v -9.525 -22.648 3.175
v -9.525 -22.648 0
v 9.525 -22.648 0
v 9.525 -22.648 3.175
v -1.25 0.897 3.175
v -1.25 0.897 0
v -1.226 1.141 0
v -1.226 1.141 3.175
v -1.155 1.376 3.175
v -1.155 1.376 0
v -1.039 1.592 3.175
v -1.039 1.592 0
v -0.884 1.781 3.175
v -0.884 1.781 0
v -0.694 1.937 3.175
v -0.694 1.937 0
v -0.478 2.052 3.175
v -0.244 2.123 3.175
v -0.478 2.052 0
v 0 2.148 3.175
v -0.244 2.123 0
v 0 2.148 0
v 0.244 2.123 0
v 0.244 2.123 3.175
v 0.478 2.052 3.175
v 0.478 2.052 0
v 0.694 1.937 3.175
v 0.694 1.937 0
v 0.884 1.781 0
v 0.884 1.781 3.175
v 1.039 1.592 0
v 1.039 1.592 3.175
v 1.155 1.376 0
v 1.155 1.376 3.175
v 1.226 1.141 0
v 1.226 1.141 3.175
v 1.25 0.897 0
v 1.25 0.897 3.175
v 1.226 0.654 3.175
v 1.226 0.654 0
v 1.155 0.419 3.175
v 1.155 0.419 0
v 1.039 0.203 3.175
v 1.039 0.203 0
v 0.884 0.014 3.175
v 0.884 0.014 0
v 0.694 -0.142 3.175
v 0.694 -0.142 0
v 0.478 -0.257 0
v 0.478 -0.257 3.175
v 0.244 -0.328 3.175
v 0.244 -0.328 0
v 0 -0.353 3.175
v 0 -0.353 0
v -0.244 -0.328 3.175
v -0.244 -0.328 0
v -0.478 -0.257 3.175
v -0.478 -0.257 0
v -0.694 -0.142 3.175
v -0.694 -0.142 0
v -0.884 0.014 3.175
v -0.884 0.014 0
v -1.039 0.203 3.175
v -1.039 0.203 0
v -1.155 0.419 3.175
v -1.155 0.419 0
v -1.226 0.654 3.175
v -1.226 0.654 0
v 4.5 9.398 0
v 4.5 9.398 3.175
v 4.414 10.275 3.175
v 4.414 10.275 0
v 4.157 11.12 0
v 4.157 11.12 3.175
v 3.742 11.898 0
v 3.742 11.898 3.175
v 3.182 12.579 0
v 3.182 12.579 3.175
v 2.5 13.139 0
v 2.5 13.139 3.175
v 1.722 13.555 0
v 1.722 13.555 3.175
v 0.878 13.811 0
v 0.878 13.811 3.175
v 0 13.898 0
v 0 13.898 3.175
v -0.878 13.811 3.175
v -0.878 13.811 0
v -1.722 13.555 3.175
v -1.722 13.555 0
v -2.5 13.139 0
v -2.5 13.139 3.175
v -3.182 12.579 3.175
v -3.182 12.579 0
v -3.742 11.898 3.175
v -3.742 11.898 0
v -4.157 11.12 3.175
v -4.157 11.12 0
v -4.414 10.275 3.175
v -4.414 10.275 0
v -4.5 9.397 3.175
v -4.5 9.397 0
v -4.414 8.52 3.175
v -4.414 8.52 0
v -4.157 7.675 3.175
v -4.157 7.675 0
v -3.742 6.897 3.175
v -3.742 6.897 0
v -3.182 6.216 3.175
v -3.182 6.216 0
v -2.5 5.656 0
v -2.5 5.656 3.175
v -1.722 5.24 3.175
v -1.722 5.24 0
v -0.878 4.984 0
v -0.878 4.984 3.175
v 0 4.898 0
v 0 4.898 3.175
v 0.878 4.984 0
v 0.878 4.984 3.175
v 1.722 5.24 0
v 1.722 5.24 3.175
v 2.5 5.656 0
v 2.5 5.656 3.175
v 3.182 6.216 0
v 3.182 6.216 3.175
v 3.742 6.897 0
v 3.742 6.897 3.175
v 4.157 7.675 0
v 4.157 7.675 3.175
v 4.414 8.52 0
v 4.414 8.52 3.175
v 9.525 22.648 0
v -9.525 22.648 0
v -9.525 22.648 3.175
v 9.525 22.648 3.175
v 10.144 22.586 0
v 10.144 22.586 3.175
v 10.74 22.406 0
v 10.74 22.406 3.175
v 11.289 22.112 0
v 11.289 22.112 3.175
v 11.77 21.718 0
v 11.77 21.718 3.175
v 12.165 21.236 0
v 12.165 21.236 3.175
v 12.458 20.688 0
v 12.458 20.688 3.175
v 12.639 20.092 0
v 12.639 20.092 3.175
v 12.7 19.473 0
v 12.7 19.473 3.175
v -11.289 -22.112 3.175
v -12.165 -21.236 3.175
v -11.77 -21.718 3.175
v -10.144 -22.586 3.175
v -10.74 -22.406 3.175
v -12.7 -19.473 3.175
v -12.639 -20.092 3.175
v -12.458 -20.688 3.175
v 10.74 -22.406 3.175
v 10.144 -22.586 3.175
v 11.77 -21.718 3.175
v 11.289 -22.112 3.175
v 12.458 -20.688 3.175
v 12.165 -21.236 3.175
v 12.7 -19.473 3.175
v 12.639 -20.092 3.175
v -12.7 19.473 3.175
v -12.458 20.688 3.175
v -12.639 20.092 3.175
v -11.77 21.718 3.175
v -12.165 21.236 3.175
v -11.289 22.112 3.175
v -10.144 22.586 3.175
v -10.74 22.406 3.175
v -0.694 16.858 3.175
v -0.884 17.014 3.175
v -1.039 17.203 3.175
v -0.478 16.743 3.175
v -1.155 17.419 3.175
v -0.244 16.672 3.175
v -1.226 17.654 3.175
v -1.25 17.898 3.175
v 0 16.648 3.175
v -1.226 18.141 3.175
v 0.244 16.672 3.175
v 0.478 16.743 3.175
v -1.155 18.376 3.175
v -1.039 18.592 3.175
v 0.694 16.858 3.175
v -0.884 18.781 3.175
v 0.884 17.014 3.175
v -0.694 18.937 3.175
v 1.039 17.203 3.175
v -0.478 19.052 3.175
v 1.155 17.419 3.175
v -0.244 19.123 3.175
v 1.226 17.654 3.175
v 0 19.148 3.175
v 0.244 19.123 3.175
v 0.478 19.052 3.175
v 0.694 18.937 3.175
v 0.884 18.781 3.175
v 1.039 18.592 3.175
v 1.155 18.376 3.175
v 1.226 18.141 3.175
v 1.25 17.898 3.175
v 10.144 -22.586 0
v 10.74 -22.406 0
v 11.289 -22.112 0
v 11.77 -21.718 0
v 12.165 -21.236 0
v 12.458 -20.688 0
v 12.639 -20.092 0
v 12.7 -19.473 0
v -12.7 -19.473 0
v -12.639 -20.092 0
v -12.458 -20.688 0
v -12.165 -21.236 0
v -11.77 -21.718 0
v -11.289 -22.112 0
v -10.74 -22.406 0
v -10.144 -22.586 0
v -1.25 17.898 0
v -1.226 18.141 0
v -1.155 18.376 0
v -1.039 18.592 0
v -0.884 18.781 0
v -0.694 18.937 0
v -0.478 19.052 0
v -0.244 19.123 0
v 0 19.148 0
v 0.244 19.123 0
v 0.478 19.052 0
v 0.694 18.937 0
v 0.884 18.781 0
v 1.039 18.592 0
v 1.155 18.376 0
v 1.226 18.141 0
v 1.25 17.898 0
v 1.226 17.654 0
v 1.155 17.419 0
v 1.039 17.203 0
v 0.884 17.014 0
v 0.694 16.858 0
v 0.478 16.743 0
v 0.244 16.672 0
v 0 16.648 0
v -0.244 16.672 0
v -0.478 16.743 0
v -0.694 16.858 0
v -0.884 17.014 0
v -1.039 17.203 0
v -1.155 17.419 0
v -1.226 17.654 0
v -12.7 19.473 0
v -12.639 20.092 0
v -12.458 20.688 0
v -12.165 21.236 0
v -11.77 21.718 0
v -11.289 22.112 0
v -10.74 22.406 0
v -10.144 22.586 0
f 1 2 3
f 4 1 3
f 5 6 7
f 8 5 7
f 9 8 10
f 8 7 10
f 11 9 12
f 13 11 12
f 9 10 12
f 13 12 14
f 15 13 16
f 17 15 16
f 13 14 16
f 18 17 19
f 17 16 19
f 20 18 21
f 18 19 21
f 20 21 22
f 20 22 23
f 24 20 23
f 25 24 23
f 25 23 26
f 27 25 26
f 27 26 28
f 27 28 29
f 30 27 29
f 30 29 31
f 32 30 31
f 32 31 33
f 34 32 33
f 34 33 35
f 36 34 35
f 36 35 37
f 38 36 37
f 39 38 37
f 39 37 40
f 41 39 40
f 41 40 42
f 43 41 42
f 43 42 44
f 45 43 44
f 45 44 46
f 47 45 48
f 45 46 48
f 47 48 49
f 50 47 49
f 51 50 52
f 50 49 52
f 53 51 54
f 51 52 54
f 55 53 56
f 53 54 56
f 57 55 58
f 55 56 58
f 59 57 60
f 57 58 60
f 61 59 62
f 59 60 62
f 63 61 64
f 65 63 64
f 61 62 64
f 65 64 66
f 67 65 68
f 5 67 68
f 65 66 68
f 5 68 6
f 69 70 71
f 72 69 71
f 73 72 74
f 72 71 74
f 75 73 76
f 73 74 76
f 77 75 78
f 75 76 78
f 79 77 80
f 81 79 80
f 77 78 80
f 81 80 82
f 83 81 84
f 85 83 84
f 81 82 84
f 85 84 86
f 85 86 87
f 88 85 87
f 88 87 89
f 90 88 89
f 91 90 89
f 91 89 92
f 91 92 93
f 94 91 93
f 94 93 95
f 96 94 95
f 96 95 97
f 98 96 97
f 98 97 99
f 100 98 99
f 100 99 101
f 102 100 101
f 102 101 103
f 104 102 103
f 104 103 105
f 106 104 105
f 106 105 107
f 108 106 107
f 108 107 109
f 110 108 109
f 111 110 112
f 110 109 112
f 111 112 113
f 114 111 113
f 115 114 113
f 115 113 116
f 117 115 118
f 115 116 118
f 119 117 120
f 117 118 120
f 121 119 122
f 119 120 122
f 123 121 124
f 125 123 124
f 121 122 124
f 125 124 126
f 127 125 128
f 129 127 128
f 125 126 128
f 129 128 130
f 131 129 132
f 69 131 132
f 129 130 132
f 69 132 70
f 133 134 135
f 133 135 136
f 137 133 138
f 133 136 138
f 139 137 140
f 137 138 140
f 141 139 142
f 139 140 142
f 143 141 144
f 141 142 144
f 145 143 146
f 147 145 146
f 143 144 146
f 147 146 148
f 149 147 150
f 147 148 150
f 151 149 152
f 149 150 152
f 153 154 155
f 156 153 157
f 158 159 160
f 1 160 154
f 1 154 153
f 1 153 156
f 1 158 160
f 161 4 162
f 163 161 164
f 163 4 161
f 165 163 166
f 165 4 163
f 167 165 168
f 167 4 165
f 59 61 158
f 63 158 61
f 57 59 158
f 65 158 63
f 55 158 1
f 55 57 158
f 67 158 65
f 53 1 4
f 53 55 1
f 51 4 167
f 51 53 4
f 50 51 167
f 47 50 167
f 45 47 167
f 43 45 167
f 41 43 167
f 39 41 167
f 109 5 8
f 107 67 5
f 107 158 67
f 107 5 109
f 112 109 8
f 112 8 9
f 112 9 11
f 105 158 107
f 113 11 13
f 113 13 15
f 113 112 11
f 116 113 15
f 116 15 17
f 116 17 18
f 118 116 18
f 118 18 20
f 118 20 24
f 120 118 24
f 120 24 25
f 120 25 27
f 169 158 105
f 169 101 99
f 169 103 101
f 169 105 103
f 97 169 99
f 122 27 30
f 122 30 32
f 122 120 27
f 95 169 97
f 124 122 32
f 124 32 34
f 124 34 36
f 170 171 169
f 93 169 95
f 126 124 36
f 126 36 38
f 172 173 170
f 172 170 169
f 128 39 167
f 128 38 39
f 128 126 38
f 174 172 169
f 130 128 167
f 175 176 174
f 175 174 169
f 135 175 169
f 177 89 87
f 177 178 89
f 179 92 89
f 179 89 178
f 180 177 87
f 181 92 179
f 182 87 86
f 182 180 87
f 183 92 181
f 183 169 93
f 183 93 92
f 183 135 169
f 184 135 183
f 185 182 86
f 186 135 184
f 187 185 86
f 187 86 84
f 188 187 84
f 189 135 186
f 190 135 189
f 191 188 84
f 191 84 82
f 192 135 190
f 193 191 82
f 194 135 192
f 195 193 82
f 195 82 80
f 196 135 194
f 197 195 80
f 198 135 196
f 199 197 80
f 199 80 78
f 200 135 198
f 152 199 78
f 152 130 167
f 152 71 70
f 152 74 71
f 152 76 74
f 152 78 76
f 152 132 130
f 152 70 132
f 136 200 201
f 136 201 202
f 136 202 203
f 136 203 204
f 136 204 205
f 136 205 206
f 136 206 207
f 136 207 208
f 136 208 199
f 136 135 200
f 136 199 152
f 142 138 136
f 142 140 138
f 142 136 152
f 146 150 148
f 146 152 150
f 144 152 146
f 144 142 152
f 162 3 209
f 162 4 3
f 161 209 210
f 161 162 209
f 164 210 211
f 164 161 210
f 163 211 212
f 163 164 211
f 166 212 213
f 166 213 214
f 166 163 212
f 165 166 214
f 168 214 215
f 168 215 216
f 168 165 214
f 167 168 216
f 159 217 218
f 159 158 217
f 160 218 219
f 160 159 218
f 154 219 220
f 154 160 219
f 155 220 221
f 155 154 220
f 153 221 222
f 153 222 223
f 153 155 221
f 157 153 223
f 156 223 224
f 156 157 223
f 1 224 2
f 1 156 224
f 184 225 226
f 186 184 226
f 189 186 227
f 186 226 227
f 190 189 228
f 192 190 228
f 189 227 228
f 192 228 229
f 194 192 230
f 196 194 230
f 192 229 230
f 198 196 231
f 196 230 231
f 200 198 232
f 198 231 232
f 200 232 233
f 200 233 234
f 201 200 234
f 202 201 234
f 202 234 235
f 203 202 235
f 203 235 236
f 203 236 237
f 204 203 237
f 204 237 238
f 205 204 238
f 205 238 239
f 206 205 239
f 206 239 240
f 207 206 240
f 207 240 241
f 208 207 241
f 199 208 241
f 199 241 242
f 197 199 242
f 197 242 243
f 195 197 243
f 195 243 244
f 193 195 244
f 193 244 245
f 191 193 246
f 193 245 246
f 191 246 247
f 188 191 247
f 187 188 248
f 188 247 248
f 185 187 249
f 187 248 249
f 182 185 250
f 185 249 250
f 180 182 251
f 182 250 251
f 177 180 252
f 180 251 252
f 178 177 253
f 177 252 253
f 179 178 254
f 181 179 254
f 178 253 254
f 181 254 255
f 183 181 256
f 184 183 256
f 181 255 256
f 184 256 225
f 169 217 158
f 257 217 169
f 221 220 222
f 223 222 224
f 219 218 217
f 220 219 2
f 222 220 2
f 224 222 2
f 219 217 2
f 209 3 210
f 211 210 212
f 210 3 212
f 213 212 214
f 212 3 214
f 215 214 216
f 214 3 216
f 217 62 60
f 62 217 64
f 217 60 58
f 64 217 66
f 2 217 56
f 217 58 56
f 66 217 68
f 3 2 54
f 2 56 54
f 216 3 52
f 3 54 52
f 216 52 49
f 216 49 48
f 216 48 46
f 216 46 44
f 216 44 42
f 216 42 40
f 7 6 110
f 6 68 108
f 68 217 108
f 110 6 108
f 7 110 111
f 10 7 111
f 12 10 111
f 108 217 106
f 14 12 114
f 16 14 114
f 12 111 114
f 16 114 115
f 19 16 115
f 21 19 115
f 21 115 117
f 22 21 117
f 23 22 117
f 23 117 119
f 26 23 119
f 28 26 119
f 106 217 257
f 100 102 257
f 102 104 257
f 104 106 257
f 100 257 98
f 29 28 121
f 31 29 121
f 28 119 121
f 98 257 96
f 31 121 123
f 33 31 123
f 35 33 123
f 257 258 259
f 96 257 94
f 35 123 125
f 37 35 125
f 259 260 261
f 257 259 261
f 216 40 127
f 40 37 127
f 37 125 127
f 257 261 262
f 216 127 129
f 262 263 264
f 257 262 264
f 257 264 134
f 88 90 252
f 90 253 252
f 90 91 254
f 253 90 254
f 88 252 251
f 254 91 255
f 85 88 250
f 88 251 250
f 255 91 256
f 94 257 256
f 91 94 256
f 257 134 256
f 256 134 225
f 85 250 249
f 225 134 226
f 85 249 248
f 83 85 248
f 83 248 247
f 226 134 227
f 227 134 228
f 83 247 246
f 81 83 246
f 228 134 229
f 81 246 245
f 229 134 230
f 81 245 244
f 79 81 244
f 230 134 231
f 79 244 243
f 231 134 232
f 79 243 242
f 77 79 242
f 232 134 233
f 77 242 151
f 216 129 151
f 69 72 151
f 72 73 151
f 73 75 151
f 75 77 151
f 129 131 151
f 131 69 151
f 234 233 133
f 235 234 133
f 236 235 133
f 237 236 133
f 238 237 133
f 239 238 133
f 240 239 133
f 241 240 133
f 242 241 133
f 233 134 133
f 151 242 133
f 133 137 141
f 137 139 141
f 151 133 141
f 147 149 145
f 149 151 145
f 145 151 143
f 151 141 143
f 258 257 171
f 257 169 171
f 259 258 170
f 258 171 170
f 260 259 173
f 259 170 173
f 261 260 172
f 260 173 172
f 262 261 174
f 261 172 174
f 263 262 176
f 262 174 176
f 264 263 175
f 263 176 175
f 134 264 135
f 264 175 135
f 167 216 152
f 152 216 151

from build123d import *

# Parameters (mm, degrees)
SKETCH1_W             = 25.4
SKETCH1_H             = 45.295
BOSS_EXTRUDE1_DEPTH   = 3.175
SKETCH2_R             = 4.5
CUT_EXTRUDE1_DEPTH    = 27.158743878
M3X0_5_TAPPED_HOLE1_D = 2.5
FILLET1_R             = 3.175


with BuildPart() as part:
    # Sketch1 → Boss-Extrude1 (new body)
    with BuildSketch(Plane.XY):
        Rectangle(SKETCH1_W, SKETCH1_H)
    extrude(amount=BOSS_EXTRUDE1_DEPTH)

    # Sketch2 → Cut-Extrude1 (cut, through all)
    with BuildSketch(Plane.XY.offset(3.175)):
        with Locations((0, 9.3975)):
            Circle(SKETCH2_R)
    extrude(amount=-CUT_EXTRUDE1_DEPTH, mode=Mode.SUBTRACT)

    # M3x0.5 Tapped Hole1 (through all)
    with Locations(Plane.XY.offset(3.175)):
        with Locations((0, 17.8975), (0, 0.8975)):
            Hole(M3X0_5_TAPPED_HOLE1_D / 2)

    # Fillet1
    fillet1_edges = [part.edges().sort_by_distance(p)[0] for p in [
        (12.7, -22.6475, 1.5875),
        (-12.7, -22.6475, 1.5875),
        (-12.7, 22.6475, 1.5875),
        (12.7, 22.6475, 1.5875),
    ]]
    fillet(fillet1_edges, radius=FILLET1_R)


solid = part.part
